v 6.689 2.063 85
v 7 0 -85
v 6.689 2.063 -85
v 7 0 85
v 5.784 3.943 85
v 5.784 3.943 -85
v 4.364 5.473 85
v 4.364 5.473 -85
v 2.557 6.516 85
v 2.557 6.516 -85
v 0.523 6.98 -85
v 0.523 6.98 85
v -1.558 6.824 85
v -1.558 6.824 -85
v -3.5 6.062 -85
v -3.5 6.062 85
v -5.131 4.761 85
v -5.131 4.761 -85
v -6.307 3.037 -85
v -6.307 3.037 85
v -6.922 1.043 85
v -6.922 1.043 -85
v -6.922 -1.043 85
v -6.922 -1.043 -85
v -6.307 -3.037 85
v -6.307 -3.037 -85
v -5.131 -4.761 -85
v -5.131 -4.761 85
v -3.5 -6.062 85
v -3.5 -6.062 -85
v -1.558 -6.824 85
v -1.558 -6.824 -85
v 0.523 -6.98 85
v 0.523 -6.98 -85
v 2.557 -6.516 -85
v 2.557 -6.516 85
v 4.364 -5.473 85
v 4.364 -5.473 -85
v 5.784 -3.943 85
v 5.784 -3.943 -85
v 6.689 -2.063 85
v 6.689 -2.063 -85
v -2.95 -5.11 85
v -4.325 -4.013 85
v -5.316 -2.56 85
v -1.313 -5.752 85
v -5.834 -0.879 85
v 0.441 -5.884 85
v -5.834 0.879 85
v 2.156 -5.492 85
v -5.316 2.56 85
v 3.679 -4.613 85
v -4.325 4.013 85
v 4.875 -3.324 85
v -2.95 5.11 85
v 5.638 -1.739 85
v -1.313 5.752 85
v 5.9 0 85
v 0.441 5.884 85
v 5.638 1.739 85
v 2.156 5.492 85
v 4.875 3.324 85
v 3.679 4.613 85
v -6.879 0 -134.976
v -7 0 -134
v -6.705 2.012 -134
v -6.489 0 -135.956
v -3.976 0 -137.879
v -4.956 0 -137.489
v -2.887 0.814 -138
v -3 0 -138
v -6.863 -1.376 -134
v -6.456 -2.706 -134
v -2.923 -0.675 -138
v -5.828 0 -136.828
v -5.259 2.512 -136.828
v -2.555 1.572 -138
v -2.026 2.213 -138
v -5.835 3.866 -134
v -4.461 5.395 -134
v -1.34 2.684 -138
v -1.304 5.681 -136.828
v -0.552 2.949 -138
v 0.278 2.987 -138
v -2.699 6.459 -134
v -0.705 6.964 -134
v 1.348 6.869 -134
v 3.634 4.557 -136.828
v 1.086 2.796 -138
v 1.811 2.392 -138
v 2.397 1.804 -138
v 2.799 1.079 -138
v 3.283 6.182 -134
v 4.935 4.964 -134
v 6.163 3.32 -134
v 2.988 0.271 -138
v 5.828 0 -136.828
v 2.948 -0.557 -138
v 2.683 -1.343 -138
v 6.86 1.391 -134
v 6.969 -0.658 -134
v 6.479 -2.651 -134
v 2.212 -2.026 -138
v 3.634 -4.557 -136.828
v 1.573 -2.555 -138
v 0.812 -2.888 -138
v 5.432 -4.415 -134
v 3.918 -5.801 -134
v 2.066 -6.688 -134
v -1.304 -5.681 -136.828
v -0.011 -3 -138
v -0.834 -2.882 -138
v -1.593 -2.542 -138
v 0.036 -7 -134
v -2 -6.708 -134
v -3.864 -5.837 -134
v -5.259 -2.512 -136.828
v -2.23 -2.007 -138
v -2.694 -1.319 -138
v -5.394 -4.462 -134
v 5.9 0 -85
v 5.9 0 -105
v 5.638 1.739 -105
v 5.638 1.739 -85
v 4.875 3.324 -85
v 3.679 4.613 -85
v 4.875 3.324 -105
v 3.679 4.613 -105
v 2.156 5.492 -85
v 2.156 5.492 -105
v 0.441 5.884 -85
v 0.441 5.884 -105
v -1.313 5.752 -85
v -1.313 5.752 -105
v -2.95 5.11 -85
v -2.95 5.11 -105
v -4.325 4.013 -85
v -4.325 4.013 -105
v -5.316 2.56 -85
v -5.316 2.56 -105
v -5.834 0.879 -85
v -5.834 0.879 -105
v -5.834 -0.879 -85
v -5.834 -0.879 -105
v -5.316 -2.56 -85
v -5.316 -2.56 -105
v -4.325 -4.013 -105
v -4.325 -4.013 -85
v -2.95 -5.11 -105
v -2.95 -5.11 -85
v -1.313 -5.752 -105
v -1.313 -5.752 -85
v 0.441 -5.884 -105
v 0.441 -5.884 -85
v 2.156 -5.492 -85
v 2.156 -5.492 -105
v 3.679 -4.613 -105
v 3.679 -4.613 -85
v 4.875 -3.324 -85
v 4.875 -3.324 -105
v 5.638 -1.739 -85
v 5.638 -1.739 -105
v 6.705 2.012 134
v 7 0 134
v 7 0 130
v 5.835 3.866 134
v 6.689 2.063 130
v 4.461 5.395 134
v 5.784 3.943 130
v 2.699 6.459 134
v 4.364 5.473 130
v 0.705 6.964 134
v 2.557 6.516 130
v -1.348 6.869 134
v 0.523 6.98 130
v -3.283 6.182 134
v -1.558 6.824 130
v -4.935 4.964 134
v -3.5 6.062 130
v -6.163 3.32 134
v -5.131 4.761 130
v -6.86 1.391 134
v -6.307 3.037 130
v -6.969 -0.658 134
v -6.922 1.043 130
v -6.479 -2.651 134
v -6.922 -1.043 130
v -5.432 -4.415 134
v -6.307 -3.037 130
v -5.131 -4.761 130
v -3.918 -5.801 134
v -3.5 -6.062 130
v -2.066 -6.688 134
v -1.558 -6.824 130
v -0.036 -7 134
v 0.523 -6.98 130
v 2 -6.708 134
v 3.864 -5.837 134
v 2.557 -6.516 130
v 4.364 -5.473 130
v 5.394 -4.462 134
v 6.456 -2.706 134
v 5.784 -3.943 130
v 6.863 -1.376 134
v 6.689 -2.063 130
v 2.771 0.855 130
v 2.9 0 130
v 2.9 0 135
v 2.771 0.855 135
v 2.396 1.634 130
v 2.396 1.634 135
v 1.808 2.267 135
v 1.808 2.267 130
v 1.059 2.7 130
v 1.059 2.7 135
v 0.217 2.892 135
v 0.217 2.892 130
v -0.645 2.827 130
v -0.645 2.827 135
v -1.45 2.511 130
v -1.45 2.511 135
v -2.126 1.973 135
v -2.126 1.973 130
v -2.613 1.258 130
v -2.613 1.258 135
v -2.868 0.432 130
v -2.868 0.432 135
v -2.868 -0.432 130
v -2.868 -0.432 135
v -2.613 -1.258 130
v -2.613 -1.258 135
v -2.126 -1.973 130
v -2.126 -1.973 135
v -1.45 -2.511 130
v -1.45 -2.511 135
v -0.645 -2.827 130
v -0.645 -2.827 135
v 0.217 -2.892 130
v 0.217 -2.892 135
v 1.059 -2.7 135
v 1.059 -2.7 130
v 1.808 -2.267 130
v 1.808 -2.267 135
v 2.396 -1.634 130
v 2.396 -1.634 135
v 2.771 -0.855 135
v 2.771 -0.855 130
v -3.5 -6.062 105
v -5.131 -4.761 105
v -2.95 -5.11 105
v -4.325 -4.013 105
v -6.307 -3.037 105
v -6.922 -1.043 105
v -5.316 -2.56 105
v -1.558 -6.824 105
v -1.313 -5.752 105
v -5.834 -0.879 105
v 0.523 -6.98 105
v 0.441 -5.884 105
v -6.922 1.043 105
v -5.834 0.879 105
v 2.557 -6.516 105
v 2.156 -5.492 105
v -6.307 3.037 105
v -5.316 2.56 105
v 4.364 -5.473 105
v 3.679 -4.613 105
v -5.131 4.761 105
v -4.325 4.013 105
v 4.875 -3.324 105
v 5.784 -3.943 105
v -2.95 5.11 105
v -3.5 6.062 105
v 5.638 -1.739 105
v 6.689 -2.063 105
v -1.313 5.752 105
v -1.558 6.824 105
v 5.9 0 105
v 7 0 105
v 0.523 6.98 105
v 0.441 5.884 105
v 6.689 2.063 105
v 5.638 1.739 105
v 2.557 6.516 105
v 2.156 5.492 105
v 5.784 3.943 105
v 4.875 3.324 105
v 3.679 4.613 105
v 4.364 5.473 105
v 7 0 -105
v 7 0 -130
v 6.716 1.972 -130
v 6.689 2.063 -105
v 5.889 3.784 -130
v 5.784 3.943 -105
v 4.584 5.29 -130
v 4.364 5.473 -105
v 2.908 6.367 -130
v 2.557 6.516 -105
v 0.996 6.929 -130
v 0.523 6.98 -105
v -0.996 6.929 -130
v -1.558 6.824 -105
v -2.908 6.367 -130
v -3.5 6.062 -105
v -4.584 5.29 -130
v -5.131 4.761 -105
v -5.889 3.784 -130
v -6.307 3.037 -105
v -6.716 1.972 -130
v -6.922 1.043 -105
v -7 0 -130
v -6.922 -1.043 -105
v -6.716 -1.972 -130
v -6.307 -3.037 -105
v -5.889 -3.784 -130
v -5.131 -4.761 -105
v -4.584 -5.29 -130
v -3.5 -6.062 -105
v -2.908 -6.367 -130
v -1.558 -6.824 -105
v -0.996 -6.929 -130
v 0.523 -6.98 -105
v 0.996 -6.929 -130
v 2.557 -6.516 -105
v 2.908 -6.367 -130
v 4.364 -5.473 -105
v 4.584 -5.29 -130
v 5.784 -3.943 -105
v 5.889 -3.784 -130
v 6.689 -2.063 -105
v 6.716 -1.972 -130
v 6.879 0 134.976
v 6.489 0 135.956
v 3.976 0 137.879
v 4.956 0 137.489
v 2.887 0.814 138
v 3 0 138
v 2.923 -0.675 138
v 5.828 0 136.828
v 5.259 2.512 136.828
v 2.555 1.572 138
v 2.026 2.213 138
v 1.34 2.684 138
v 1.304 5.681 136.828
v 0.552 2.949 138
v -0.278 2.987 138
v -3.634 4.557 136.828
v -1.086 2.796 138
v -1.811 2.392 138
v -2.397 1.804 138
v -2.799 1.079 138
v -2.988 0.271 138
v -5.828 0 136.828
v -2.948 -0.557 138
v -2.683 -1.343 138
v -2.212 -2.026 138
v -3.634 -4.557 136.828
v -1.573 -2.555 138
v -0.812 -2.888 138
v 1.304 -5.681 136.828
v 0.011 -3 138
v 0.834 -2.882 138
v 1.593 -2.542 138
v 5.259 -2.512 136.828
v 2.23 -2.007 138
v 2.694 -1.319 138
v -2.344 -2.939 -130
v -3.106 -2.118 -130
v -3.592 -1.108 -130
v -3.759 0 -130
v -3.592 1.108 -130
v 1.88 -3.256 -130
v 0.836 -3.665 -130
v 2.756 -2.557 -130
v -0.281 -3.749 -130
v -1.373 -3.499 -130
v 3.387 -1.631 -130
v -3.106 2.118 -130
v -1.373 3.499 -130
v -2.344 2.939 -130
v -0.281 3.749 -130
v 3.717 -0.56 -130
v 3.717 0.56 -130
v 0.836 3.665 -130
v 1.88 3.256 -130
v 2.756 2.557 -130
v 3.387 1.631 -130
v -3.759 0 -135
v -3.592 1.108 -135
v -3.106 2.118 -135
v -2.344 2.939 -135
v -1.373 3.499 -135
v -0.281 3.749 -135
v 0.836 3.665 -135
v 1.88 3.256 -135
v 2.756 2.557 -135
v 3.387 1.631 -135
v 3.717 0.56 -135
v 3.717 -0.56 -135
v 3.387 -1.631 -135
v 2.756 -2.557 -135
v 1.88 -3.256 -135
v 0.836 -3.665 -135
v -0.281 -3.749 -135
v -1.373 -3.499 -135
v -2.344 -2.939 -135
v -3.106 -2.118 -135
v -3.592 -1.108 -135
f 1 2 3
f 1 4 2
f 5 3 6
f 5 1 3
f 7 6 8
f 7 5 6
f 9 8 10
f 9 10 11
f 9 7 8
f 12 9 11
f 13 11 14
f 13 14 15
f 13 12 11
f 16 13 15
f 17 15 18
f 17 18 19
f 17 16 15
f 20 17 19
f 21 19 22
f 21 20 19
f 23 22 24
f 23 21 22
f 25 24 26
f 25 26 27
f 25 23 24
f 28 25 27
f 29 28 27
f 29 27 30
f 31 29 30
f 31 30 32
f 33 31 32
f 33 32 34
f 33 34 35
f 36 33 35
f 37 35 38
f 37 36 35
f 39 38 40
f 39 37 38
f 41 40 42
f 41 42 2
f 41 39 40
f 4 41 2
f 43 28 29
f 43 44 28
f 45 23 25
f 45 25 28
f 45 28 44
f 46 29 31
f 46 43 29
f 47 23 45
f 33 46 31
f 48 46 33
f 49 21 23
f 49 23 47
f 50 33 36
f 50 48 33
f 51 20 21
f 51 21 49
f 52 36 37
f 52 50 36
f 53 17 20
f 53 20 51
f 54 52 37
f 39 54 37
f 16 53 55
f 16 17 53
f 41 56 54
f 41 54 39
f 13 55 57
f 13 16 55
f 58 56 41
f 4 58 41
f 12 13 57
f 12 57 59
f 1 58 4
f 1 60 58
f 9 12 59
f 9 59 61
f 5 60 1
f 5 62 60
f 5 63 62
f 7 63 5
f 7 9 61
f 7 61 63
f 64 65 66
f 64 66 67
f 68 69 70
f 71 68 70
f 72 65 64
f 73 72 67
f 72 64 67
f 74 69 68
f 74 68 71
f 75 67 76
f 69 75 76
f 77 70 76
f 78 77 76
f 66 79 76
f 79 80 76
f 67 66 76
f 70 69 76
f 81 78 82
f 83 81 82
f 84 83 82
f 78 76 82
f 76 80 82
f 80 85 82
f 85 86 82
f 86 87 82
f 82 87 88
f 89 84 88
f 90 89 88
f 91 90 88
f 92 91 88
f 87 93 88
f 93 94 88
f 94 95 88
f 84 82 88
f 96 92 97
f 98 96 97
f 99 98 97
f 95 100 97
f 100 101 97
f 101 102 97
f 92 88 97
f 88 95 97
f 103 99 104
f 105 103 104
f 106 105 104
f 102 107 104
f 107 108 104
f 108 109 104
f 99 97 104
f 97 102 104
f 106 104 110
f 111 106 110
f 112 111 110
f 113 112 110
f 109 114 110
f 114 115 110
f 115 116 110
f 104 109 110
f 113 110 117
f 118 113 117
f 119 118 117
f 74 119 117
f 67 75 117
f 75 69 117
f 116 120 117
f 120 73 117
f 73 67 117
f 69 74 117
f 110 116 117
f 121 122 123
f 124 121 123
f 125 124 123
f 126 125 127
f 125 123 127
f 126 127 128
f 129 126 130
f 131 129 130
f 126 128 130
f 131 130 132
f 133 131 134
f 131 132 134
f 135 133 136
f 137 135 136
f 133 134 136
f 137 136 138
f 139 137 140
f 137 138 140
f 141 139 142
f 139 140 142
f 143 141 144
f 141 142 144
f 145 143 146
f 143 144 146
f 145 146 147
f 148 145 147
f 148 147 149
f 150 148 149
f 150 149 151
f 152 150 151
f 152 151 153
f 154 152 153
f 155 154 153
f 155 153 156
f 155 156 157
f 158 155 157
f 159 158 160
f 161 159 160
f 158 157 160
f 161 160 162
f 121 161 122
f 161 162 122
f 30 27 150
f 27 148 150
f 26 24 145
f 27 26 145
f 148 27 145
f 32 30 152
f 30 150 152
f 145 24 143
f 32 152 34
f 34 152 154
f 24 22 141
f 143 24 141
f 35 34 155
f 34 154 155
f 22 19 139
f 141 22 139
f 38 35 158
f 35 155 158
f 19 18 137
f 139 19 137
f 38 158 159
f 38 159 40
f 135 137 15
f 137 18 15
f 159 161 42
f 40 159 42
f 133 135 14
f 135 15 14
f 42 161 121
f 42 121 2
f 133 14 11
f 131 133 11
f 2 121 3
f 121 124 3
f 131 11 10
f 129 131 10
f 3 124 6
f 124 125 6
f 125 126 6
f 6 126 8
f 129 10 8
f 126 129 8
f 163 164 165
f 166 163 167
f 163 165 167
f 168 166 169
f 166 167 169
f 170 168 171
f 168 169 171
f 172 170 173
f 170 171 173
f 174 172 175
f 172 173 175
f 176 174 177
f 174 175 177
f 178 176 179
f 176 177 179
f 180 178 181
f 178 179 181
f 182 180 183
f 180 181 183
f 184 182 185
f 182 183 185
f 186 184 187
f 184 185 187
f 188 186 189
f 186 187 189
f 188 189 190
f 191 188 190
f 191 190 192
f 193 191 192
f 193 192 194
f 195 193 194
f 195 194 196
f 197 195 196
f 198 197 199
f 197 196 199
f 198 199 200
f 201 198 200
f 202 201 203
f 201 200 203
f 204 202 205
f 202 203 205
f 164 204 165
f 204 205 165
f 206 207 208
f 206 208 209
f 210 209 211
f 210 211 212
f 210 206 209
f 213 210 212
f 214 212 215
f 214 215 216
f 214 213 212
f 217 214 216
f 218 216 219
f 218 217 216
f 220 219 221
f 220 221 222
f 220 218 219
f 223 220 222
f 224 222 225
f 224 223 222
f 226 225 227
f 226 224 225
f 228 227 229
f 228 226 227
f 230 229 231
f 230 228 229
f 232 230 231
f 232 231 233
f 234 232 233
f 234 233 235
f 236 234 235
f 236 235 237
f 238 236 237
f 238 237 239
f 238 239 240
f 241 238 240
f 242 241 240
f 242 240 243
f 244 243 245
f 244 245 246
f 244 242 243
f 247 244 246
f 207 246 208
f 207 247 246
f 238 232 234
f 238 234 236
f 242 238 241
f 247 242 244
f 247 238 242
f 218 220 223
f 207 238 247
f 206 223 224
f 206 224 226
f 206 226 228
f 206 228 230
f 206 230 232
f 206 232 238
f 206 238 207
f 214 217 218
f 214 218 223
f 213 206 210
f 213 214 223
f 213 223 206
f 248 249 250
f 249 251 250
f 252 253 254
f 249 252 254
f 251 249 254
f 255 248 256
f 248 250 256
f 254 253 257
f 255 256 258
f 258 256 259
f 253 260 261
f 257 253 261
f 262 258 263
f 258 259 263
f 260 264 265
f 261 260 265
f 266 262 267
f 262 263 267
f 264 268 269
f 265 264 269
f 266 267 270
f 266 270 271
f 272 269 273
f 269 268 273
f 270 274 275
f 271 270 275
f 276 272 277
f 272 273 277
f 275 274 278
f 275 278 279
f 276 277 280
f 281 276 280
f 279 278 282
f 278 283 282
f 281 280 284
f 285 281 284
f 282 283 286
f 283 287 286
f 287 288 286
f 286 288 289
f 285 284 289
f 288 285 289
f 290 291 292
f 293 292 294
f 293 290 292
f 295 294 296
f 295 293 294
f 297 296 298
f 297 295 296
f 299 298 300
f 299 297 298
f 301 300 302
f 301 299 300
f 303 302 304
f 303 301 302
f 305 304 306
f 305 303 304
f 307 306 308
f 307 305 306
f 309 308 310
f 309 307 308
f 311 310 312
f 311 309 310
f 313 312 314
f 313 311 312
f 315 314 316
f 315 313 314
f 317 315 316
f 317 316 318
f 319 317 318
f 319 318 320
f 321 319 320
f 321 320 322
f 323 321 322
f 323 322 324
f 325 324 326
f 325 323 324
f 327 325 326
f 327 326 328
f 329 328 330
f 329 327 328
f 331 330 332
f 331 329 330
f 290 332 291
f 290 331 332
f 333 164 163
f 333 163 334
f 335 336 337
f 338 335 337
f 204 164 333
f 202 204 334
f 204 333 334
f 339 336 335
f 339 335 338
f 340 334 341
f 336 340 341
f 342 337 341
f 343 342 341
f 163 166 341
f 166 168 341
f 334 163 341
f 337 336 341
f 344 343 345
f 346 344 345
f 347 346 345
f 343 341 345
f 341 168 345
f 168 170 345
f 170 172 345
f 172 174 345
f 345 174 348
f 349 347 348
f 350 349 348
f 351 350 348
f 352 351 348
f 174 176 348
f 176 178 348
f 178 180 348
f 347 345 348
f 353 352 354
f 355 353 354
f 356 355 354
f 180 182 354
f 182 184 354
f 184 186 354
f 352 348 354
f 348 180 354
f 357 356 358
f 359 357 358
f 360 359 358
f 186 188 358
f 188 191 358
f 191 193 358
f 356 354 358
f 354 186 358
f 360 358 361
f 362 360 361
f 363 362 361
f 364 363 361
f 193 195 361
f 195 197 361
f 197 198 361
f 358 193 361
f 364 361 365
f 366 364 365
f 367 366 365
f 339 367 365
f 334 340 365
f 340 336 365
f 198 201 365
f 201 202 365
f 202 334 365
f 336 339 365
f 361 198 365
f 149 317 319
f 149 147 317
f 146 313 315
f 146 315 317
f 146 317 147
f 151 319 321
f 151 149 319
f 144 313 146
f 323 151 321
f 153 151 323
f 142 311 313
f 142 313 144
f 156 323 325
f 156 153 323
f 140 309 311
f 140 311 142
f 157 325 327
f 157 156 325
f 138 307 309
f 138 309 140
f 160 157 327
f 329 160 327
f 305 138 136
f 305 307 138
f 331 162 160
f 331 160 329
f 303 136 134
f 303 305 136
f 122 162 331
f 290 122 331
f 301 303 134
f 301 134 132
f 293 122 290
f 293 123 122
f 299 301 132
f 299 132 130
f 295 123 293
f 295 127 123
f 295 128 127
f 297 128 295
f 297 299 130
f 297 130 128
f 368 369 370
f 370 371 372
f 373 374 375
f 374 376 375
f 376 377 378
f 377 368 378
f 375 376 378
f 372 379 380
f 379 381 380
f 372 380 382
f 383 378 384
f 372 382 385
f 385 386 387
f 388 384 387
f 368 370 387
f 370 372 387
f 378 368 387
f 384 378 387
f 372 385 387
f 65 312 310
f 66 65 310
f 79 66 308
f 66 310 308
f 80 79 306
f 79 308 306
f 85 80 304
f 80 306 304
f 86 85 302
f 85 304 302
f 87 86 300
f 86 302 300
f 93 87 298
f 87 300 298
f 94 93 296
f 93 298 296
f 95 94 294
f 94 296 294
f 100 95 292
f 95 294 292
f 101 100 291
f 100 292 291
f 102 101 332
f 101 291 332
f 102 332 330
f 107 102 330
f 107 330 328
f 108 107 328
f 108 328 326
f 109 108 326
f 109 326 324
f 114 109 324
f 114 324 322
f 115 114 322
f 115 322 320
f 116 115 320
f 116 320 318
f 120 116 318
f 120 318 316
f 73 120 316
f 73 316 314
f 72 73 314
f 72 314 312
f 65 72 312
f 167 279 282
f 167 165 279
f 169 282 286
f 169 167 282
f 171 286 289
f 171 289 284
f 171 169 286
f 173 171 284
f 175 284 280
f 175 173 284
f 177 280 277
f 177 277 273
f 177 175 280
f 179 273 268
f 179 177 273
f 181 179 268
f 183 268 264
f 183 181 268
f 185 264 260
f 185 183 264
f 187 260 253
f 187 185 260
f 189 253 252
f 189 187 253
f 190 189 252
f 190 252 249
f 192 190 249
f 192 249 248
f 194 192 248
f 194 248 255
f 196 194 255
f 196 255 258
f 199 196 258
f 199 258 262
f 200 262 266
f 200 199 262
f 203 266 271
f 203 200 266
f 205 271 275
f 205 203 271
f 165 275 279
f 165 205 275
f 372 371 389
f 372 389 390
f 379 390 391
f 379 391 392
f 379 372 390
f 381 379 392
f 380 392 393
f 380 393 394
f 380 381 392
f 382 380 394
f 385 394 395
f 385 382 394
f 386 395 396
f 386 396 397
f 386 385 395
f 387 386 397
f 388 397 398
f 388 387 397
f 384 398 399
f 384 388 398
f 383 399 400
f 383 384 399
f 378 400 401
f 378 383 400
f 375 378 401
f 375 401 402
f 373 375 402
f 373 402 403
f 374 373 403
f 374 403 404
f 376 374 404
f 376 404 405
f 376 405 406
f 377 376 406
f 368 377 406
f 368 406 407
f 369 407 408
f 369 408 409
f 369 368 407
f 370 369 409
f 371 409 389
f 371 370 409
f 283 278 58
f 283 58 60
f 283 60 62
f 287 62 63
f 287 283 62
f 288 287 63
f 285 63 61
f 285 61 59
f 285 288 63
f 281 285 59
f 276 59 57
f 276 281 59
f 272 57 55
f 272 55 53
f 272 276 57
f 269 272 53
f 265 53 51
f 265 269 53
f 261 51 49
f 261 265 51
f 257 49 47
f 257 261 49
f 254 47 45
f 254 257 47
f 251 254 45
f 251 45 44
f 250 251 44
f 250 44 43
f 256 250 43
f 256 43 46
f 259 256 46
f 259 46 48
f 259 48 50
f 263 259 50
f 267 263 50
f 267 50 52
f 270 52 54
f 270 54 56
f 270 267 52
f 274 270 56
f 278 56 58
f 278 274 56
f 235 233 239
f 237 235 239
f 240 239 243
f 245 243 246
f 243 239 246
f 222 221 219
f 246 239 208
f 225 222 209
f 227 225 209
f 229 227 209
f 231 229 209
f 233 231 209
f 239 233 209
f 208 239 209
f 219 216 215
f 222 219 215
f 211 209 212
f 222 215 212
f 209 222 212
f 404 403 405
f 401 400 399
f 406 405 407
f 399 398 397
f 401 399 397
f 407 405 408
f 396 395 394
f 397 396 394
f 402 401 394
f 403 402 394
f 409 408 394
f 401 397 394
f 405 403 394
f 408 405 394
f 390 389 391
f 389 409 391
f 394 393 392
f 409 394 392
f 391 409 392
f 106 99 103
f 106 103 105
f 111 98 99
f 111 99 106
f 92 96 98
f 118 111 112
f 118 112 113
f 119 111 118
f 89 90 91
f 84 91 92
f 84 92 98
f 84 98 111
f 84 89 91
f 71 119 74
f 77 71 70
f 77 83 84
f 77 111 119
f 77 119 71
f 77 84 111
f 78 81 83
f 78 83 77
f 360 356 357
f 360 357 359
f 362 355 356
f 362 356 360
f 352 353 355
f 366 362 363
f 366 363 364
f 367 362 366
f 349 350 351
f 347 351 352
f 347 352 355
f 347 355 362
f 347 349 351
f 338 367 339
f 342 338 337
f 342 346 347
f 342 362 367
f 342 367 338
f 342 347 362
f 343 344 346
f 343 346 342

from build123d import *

# Parameters (mm, degrees)
SKETCH1_R            = 7
BOSS_EXTRUDE1_DEPTH  = 130
SKETCH9_R            = 7
SKETCH9_R_2          = 3.759161882
BOSS_EXTRUDE7_DEPTH  = 5
SKETCH10_R           = 7
BOSS_EXTRUDE8_DEPTH  = 3
FILLET6_R            = 4
SKETCH12_R           = 7
SKETCH12_R_2         = 2.9
BOSS_EXTRUDE9_DEPTH  = 5
SKETCH13_R           = 7
BOSS_EXTRUDE10_DEPTH = 3
FILLET7_R            = 4
SKETCH15_R           = 7
SKETCH15_R_2         = 5.9
CUT_EXTRUDE1_DEPTH   = 20
SKETCH16_R           = 7
SKETCH16_R_2         = 5.9
CUT_EXTRUDE2_DEPTH   = 20


with BuildPart() as part:
    # Sketch1 → Boss-Extrude1 (new body, symmetric)
    with BuildSketch(Plane.XY):
        Circle(SKETCH1_R)
    extrude(amount=BOSS_EXTRUDE1_DEPTH, both=True)

    # Sketch9 → Boss-Extrude7 (add)
    with BuildSketch(Plane(origin=(0, 0, -130), x_dir=(-1, 0, 0), z_dir=(0, 0, -1))):
        Circle(SKETCH9_R)
        Circle(SKETCH9_R_2, mode=Mode.SUBTRACT)
    extrude(amount=BOSS_EXTRUDE7_DEPTH)

    # Sketch10 → Boss-Extrude8 (add)
    with BuildSketch(Plane(origin=(0, 0, -135), x_dir=(-1, 0, 0), z_dir=(0, 0, -1))):
        Circle(SKETCH10_R)
    extrude(amount=BOSS_EXTRUDE8_DEPTH)

    # Fillet6
    fillet6_edges = [part.edges().sort_by_distance(p)[0] for p in [
        (7, 0, -138),
    ]]
    fillet(fillet6_edges, radius=FILLET6_R)

    # Sketch12 → Boss-Extrude9 (add)
    with BuildSketch(Plane.XY.offset(130)):
        Circle(SKETCH12_R)
        Circle(SKETCH12_R_2, mode=Mode.SUBTRACT)
    extrude(amount=BOSS_EXTRUDE9_DEPTH)

    # Sketch13 → Boss-Extrude10 (add)
    with BuildSketch(Plane.XY.offset(135)):
        Circle(SKETCH13_R)
    extrude(amount=BOSS_EXTRUDE10_DEPTH)

    # Fillet7
    fillet7_edges = [part.edges().sort_by_distance(p)[0] for p in [
        (-7, 0, 138),
    ]]
    fillet(fillet7_edges, radius=FILLET7_R)

    # Sketch15 → Cut-Extrude1 (cut)
    with BuildSketch(Plane.XY.offset(105)):
        Circle(SKETCH15_R)
        Circle(SKETCH15_R_2, mode=Mode.SUBTRACT)
    extrude(amount=-CUT_EXTRUDE1_DEPTH, mode=Mode.SUBTRACT)

    # Sketch16 → Cut-Extrude2 (cut)
    with BuildSketch(Plane.XY.offset(-105)):
        Circle(SKETCH16_R)
        Circle(SKETCH16_R_2, mode=Mode.SUBTRACT)
    extrude(amount=CUT_EXTRUDE2_DEPTH, mode=Mode.SUBTRACT)


solid = part.part
